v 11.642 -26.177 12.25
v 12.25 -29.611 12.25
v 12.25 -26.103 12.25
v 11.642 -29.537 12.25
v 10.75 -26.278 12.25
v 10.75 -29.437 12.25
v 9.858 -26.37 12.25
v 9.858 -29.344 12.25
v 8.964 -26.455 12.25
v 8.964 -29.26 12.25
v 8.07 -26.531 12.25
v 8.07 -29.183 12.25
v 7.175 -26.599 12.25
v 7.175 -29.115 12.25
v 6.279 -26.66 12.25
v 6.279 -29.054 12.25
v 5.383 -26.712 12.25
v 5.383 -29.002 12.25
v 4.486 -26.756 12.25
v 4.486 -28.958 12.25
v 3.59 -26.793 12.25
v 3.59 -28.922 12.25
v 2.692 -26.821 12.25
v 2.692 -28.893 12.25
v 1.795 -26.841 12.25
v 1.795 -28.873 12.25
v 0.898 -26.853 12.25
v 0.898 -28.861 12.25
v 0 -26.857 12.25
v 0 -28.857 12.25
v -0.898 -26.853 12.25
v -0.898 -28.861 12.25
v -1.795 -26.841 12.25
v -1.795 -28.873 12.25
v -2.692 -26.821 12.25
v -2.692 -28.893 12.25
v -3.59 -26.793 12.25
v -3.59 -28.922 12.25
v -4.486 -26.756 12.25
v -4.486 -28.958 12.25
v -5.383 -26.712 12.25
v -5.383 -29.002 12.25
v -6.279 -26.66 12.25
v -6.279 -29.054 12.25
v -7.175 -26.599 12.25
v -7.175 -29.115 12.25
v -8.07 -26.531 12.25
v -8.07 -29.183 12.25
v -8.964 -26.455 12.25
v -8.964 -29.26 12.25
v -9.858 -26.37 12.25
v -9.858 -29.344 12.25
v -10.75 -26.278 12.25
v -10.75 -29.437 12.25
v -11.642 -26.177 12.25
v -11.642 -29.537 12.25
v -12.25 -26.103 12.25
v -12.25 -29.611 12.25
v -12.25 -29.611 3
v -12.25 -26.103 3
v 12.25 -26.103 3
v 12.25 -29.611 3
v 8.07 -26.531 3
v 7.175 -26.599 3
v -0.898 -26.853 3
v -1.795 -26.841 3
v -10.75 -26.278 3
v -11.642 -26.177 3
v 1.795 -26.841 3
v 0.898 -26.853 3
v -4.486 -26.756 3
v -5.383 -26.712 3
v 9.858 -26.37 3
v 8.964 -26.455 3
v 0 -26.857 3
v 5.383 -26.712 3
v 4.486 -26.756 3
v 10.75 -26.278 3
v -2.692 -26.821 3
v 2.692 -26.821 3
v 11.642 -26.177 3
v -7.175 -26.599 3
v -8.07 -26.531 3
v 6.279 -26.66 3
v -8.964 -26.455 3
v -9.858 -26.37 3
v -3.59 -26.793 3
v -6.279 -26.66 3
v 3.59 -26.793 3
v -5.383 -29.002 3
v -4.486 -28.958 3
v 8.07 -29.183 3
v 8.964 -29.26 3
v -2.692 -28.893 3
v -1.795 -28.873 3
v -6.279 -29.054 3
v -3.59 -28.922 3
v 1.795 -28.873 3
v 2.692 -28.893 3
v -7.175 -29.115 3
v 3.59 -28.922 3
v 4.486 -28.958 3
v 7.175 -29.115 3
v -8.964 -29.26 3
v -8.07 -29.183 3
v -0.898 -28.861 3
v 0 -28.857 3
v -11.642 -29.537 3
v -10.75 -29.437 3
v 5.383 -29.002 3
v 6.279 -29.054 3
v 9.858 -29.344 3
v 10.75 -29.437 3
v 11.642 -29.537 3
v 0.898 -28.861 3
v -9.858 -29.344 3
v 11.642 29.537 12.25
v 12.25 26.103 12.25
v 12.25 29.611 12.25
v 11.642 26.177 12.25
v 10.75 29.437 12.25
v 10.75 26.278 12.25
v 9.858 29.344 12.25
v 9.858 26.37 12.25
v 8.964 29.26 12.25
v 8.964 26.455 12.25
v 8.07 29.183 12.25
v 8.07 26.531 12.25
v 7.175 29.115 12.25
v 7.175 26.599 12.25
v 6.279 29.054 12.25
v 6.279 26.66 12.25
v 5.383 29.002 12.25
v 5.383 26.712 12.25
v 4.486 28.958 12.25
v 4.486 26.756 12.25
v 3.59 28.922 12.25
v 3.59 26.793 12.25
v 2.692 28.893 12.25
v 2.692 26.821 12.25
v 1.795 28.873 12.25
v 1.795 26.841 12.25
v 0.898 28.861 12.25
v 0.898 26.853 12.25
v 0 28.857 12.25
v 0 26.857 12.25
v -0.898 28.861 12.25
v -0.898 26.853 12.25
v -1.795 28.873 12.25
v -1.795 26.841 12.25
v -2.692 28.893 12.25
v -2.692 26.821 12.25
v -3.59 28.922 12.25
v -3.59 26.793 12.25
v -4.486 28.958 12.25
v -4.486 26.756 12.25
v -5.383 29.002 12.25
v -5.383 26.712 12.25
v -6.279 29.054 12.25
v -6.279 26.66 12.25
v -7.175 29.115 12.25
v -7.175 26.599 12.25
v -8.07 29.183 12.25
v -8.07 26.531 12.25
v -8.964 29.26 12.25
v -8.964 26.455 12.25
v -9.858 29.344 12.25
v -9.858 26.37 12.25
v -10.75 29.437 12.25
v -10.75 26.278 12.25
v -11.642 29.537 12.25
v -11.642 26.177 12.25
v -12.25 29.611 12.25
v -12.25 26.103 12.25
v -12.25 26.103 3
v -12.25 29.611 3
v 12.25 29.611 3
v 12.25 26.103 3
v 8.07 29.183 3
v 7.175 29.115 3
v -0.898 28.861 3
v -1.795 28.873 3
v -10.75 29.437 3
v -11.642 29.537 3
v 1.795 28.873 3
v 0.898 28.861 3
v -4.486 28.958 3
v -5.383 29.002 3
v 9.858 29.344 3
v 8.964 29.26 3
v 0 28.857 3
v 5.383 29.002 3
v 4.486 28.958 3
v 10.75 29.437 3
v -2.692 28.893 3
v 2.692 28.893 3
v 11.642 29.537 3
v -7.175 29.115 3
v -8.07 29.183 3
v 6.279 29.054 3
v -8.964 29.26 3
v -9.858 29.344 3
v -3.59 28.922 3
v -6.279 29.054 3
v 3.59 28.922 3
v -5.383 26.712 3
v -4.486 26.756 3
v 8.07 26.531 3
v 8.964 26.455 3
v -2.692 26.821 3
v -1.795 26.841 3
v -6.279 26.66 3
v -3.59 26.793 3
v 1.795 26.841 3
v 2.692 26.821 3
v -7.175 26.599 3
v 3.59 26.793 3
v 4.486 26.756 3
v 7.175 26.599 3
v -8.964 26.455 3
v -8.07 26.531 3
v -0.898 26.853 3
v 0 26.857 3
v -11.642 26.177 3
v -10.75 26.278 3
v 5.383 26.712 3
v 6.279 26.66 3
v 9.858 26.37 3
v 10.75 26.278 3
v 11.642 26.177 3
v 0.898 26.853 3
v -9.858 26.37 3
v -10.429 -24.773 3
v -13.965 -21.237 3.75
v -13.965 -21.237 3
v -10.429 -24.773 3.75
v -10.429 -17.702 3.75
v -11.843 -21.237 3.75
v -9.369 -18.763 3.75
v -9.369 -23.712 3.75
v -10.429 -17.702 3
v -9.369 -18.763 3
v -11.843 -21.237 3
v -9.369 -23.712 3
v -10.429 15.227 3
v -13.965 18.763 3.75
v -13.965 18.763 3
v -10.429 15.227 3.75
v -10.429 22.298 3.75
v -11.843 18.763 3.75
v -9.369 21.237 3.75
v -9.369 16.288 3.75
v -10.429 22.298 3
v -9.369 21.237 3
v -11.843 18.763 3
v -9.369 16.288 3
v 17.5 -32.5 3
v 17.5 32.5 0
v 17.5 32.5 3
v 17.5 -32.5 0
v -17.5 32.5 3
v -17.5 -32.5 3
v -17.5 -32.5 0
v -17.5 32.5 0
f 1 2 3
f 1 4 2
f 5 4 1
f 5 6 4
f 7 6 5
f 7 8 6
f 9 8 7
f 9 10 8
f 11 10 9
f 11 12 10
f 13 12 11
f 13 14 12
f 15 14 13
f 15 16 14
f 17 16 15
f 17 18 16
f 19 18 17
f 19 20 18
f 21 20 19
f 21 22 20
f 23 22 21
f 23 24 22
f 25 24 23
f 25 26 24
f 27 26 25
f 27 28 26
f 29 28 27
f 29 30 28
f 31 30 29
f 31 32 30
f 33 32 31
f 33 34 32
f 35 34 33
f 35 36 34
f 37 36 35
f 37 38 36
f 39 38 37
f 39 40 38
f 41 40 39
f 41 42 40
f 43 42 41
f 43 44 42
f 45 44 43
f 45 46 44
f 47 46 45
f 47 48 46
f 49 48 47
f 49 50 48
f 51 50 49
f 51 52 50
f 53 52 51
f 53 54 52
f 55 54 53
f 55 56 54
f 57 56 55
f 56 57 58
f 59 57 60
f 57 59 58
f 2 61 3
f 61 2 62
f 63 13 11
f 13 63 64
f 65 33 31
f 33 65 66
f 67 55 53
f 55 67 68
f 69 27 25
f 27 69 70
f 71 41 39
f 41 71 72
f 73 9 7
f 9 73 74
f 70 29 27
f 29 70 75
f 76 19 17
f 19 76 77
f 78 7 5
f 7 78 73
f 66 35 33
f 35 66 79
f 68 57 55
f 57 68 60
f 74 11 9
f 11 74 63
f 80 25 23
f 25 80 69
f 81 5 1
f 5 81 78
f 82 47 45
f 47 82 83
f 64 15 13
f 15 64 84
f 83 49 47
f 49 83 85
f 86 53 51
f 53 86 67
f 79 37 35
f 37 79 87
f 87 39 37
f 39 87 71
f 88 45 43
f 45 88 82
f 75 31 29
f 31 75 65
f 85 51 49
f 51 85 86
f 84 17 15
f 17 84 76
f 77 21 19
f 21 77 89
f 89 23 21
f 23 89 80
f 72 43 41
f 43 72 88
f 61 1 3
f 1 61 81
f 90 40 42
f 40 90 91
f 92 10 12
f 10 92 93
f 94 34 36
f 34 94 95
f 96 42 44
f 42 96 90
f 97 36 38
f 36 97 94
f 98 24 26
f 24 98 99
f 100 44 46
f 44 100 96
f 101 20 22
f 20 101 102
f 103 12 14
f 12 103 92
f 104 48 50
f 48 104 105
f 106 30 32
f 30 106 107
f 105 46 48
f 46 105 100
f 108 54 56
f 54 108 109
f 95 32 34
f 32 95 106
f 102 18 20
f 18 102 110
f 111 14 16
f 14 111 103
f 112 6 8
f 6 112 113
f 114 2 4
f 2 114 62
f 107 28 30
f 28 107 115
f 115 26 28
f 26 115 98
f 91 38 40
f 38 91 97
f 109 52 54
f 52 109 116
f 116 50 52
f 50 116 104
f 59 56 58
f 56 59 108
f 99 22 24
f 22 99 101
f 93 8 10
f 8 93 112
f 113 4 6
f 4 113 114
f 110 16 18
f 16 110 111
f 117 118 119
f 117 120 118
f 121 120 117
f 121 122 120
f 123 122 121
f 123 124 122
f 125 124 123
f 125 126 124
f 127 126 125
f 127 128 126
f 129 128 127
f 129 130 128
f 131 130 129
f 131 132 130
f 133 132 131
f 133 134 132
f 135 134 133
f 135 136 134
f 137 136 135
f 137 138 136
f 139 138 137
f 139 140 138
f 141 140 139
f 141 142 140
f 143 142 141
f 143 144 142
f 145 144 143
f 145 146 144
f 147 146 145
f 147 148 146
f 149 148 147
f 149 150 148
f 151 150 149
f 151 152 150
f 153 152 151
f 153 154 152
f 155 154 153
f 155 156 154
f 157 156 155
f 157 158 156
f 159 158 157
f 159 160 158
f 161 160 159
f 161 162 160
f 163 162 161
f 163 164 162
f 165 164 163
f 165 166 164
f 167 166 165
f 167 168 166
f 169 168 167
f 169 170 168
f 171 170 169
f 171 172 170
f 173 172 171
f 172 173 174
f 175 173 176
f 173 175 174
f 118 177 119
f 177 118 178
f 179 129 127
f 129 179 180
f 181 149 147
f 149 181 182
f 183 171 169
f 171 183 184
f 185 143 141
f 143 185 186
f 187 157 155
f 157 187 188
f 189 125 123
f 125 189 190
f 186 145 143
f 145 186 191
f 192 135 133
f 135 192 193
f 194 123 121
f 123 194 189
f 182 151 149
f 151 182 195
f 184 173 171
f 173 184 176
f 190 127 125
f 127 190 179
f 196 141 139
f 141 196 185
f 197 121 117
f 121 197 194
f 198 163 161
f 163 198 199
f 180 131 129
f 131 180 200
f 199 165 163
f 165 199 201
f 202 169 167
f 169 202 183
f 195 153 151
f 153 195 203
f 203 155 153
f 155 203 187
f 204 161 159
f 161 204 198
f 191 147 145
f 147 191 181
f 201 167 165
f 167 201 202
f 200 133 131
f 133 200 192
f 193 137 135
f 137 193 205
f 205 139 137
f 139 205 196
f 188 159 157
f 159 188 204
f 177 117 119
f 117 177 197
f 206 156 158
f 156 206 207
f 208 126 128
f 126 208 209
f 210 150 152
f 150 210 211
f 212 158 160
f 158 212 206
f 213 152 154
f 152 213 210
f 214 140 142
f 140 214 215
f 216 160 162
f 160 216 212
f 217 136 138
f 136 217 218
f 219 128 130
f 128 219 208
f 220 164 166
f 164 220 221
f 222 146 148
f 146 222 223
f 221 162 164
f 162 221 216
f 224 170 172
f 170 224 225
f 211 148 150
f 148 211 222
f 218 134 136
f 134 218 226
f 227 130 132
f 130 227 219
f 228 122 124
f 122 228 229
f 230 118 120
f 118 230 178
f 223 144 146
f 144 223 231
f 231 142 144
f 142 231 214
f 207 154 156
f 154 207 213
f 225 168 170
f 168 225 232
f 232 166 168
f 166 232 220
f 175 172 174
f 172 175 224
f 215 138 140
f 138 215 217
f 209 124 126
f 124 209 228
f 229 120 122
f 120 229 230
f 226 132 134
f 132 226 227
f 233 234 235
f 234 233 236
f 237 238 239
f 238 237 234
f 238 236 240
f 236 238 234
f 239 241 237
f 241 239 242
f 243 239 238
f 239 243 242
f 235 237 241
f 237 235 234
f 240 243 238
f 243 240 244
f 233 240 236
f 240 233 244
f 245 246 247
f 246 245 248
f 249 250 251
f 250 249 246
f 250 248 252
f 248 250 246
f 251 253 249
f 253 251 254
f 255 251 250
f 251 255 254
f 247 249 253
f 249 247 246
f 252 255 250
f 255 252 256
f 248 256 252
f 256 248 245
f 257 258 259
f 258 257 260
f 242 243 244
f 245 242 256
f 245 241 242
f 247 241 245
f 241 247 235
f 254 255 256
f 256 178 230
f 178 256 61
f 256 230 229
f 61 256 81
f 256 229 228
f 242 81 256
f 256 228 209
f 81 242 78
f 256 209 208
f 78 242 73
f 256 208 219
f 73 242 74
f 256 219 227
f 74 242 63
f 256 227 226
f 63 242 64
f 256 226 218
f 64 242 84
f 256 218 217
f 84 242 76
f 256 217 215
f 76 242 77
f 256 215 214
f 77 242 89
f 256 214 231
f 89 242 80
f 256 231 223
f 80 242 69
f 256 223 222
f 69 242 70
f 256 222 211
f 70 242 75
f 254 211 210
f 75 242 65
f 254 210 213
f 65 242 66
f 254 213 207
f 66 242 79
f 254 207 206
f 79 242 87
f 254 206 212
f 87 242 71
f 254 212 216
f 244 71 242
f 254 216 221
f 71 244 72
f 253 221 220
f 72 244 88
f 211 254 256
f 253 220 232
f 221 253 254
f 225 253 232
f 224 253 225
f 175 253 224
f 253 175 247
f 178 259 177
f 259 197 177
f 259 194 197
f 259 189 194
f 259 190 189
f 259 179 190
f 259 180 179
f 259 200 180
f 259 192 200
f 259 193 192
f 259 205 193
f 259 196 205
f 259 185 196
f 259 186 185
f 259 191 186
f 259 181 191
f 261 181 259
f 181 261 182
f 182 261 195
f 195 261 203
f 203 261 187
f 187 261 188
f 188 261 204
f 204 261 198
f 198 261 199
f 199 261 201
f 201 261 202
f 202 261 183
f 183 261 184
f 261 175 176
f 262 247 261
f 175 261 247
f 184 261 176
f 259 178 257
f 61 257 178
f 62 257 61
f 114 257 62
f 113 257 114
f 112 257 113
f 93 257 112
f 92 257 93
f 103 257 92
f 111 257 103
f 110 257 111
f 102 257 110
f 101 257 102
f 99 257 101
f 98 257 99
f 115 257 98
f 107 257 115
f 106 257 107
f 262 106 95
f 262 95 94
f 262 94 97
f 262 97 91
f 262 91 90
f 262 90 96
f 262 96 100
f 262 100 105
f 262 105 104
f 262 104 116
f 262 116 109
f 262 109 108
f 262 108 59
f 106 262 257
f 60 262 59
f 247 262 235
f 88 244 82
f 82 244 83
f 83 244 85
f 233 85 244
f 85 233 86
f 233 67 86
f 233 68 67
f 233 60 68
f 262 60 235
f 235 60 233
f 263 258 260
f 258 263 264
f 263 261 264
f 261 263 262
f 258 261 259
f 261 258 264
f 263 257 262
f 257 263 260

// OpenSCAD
WIDTH=35;
LENGTH=65;

module handle() {
    rotate(90, [0, 0, 1]) {
        difference() {
            cube(size = [6,WIDTH-WIDTH*0.3,10], center = true);
            
            translate([101,0,0]) cylinder(h = 10.1, r = 100, $fn=700, center = true);
            translate([-101,0,0]) cylinder(h = 10.1, r = 100, $fn=700, center = true);
        }
    }    
}

module arrow() {
    // arrow
    rotate([0,0,-135]) {
        cube([5, 1.5, 1.5], center = true);
        translate ([1.75,1.75,0]) cube([1.5, 5, 1.5], center = true);
    }
}

union () {
    // scale([1.8, 1.8, 1.8]) translate([2.2,-1,1.5]) import("elf_mage_by_nicoledelancret.stl", convexity=3);
    translate([-WIDTH/2,-LENGTH/2,0]) cube([WIDTH,LENGTH,3]);
    
    translate([0,3*-LENGTH/7,7.25]) handle();    
    translate([0,3*LENGTH/7,7.25]) handle();    
    
    translate([- WIDTH/3,4*-LENGTH/13,3]) arrow();
    translate([- WIDTH/3,4*LENGTH/13,3]) arrow();
}
